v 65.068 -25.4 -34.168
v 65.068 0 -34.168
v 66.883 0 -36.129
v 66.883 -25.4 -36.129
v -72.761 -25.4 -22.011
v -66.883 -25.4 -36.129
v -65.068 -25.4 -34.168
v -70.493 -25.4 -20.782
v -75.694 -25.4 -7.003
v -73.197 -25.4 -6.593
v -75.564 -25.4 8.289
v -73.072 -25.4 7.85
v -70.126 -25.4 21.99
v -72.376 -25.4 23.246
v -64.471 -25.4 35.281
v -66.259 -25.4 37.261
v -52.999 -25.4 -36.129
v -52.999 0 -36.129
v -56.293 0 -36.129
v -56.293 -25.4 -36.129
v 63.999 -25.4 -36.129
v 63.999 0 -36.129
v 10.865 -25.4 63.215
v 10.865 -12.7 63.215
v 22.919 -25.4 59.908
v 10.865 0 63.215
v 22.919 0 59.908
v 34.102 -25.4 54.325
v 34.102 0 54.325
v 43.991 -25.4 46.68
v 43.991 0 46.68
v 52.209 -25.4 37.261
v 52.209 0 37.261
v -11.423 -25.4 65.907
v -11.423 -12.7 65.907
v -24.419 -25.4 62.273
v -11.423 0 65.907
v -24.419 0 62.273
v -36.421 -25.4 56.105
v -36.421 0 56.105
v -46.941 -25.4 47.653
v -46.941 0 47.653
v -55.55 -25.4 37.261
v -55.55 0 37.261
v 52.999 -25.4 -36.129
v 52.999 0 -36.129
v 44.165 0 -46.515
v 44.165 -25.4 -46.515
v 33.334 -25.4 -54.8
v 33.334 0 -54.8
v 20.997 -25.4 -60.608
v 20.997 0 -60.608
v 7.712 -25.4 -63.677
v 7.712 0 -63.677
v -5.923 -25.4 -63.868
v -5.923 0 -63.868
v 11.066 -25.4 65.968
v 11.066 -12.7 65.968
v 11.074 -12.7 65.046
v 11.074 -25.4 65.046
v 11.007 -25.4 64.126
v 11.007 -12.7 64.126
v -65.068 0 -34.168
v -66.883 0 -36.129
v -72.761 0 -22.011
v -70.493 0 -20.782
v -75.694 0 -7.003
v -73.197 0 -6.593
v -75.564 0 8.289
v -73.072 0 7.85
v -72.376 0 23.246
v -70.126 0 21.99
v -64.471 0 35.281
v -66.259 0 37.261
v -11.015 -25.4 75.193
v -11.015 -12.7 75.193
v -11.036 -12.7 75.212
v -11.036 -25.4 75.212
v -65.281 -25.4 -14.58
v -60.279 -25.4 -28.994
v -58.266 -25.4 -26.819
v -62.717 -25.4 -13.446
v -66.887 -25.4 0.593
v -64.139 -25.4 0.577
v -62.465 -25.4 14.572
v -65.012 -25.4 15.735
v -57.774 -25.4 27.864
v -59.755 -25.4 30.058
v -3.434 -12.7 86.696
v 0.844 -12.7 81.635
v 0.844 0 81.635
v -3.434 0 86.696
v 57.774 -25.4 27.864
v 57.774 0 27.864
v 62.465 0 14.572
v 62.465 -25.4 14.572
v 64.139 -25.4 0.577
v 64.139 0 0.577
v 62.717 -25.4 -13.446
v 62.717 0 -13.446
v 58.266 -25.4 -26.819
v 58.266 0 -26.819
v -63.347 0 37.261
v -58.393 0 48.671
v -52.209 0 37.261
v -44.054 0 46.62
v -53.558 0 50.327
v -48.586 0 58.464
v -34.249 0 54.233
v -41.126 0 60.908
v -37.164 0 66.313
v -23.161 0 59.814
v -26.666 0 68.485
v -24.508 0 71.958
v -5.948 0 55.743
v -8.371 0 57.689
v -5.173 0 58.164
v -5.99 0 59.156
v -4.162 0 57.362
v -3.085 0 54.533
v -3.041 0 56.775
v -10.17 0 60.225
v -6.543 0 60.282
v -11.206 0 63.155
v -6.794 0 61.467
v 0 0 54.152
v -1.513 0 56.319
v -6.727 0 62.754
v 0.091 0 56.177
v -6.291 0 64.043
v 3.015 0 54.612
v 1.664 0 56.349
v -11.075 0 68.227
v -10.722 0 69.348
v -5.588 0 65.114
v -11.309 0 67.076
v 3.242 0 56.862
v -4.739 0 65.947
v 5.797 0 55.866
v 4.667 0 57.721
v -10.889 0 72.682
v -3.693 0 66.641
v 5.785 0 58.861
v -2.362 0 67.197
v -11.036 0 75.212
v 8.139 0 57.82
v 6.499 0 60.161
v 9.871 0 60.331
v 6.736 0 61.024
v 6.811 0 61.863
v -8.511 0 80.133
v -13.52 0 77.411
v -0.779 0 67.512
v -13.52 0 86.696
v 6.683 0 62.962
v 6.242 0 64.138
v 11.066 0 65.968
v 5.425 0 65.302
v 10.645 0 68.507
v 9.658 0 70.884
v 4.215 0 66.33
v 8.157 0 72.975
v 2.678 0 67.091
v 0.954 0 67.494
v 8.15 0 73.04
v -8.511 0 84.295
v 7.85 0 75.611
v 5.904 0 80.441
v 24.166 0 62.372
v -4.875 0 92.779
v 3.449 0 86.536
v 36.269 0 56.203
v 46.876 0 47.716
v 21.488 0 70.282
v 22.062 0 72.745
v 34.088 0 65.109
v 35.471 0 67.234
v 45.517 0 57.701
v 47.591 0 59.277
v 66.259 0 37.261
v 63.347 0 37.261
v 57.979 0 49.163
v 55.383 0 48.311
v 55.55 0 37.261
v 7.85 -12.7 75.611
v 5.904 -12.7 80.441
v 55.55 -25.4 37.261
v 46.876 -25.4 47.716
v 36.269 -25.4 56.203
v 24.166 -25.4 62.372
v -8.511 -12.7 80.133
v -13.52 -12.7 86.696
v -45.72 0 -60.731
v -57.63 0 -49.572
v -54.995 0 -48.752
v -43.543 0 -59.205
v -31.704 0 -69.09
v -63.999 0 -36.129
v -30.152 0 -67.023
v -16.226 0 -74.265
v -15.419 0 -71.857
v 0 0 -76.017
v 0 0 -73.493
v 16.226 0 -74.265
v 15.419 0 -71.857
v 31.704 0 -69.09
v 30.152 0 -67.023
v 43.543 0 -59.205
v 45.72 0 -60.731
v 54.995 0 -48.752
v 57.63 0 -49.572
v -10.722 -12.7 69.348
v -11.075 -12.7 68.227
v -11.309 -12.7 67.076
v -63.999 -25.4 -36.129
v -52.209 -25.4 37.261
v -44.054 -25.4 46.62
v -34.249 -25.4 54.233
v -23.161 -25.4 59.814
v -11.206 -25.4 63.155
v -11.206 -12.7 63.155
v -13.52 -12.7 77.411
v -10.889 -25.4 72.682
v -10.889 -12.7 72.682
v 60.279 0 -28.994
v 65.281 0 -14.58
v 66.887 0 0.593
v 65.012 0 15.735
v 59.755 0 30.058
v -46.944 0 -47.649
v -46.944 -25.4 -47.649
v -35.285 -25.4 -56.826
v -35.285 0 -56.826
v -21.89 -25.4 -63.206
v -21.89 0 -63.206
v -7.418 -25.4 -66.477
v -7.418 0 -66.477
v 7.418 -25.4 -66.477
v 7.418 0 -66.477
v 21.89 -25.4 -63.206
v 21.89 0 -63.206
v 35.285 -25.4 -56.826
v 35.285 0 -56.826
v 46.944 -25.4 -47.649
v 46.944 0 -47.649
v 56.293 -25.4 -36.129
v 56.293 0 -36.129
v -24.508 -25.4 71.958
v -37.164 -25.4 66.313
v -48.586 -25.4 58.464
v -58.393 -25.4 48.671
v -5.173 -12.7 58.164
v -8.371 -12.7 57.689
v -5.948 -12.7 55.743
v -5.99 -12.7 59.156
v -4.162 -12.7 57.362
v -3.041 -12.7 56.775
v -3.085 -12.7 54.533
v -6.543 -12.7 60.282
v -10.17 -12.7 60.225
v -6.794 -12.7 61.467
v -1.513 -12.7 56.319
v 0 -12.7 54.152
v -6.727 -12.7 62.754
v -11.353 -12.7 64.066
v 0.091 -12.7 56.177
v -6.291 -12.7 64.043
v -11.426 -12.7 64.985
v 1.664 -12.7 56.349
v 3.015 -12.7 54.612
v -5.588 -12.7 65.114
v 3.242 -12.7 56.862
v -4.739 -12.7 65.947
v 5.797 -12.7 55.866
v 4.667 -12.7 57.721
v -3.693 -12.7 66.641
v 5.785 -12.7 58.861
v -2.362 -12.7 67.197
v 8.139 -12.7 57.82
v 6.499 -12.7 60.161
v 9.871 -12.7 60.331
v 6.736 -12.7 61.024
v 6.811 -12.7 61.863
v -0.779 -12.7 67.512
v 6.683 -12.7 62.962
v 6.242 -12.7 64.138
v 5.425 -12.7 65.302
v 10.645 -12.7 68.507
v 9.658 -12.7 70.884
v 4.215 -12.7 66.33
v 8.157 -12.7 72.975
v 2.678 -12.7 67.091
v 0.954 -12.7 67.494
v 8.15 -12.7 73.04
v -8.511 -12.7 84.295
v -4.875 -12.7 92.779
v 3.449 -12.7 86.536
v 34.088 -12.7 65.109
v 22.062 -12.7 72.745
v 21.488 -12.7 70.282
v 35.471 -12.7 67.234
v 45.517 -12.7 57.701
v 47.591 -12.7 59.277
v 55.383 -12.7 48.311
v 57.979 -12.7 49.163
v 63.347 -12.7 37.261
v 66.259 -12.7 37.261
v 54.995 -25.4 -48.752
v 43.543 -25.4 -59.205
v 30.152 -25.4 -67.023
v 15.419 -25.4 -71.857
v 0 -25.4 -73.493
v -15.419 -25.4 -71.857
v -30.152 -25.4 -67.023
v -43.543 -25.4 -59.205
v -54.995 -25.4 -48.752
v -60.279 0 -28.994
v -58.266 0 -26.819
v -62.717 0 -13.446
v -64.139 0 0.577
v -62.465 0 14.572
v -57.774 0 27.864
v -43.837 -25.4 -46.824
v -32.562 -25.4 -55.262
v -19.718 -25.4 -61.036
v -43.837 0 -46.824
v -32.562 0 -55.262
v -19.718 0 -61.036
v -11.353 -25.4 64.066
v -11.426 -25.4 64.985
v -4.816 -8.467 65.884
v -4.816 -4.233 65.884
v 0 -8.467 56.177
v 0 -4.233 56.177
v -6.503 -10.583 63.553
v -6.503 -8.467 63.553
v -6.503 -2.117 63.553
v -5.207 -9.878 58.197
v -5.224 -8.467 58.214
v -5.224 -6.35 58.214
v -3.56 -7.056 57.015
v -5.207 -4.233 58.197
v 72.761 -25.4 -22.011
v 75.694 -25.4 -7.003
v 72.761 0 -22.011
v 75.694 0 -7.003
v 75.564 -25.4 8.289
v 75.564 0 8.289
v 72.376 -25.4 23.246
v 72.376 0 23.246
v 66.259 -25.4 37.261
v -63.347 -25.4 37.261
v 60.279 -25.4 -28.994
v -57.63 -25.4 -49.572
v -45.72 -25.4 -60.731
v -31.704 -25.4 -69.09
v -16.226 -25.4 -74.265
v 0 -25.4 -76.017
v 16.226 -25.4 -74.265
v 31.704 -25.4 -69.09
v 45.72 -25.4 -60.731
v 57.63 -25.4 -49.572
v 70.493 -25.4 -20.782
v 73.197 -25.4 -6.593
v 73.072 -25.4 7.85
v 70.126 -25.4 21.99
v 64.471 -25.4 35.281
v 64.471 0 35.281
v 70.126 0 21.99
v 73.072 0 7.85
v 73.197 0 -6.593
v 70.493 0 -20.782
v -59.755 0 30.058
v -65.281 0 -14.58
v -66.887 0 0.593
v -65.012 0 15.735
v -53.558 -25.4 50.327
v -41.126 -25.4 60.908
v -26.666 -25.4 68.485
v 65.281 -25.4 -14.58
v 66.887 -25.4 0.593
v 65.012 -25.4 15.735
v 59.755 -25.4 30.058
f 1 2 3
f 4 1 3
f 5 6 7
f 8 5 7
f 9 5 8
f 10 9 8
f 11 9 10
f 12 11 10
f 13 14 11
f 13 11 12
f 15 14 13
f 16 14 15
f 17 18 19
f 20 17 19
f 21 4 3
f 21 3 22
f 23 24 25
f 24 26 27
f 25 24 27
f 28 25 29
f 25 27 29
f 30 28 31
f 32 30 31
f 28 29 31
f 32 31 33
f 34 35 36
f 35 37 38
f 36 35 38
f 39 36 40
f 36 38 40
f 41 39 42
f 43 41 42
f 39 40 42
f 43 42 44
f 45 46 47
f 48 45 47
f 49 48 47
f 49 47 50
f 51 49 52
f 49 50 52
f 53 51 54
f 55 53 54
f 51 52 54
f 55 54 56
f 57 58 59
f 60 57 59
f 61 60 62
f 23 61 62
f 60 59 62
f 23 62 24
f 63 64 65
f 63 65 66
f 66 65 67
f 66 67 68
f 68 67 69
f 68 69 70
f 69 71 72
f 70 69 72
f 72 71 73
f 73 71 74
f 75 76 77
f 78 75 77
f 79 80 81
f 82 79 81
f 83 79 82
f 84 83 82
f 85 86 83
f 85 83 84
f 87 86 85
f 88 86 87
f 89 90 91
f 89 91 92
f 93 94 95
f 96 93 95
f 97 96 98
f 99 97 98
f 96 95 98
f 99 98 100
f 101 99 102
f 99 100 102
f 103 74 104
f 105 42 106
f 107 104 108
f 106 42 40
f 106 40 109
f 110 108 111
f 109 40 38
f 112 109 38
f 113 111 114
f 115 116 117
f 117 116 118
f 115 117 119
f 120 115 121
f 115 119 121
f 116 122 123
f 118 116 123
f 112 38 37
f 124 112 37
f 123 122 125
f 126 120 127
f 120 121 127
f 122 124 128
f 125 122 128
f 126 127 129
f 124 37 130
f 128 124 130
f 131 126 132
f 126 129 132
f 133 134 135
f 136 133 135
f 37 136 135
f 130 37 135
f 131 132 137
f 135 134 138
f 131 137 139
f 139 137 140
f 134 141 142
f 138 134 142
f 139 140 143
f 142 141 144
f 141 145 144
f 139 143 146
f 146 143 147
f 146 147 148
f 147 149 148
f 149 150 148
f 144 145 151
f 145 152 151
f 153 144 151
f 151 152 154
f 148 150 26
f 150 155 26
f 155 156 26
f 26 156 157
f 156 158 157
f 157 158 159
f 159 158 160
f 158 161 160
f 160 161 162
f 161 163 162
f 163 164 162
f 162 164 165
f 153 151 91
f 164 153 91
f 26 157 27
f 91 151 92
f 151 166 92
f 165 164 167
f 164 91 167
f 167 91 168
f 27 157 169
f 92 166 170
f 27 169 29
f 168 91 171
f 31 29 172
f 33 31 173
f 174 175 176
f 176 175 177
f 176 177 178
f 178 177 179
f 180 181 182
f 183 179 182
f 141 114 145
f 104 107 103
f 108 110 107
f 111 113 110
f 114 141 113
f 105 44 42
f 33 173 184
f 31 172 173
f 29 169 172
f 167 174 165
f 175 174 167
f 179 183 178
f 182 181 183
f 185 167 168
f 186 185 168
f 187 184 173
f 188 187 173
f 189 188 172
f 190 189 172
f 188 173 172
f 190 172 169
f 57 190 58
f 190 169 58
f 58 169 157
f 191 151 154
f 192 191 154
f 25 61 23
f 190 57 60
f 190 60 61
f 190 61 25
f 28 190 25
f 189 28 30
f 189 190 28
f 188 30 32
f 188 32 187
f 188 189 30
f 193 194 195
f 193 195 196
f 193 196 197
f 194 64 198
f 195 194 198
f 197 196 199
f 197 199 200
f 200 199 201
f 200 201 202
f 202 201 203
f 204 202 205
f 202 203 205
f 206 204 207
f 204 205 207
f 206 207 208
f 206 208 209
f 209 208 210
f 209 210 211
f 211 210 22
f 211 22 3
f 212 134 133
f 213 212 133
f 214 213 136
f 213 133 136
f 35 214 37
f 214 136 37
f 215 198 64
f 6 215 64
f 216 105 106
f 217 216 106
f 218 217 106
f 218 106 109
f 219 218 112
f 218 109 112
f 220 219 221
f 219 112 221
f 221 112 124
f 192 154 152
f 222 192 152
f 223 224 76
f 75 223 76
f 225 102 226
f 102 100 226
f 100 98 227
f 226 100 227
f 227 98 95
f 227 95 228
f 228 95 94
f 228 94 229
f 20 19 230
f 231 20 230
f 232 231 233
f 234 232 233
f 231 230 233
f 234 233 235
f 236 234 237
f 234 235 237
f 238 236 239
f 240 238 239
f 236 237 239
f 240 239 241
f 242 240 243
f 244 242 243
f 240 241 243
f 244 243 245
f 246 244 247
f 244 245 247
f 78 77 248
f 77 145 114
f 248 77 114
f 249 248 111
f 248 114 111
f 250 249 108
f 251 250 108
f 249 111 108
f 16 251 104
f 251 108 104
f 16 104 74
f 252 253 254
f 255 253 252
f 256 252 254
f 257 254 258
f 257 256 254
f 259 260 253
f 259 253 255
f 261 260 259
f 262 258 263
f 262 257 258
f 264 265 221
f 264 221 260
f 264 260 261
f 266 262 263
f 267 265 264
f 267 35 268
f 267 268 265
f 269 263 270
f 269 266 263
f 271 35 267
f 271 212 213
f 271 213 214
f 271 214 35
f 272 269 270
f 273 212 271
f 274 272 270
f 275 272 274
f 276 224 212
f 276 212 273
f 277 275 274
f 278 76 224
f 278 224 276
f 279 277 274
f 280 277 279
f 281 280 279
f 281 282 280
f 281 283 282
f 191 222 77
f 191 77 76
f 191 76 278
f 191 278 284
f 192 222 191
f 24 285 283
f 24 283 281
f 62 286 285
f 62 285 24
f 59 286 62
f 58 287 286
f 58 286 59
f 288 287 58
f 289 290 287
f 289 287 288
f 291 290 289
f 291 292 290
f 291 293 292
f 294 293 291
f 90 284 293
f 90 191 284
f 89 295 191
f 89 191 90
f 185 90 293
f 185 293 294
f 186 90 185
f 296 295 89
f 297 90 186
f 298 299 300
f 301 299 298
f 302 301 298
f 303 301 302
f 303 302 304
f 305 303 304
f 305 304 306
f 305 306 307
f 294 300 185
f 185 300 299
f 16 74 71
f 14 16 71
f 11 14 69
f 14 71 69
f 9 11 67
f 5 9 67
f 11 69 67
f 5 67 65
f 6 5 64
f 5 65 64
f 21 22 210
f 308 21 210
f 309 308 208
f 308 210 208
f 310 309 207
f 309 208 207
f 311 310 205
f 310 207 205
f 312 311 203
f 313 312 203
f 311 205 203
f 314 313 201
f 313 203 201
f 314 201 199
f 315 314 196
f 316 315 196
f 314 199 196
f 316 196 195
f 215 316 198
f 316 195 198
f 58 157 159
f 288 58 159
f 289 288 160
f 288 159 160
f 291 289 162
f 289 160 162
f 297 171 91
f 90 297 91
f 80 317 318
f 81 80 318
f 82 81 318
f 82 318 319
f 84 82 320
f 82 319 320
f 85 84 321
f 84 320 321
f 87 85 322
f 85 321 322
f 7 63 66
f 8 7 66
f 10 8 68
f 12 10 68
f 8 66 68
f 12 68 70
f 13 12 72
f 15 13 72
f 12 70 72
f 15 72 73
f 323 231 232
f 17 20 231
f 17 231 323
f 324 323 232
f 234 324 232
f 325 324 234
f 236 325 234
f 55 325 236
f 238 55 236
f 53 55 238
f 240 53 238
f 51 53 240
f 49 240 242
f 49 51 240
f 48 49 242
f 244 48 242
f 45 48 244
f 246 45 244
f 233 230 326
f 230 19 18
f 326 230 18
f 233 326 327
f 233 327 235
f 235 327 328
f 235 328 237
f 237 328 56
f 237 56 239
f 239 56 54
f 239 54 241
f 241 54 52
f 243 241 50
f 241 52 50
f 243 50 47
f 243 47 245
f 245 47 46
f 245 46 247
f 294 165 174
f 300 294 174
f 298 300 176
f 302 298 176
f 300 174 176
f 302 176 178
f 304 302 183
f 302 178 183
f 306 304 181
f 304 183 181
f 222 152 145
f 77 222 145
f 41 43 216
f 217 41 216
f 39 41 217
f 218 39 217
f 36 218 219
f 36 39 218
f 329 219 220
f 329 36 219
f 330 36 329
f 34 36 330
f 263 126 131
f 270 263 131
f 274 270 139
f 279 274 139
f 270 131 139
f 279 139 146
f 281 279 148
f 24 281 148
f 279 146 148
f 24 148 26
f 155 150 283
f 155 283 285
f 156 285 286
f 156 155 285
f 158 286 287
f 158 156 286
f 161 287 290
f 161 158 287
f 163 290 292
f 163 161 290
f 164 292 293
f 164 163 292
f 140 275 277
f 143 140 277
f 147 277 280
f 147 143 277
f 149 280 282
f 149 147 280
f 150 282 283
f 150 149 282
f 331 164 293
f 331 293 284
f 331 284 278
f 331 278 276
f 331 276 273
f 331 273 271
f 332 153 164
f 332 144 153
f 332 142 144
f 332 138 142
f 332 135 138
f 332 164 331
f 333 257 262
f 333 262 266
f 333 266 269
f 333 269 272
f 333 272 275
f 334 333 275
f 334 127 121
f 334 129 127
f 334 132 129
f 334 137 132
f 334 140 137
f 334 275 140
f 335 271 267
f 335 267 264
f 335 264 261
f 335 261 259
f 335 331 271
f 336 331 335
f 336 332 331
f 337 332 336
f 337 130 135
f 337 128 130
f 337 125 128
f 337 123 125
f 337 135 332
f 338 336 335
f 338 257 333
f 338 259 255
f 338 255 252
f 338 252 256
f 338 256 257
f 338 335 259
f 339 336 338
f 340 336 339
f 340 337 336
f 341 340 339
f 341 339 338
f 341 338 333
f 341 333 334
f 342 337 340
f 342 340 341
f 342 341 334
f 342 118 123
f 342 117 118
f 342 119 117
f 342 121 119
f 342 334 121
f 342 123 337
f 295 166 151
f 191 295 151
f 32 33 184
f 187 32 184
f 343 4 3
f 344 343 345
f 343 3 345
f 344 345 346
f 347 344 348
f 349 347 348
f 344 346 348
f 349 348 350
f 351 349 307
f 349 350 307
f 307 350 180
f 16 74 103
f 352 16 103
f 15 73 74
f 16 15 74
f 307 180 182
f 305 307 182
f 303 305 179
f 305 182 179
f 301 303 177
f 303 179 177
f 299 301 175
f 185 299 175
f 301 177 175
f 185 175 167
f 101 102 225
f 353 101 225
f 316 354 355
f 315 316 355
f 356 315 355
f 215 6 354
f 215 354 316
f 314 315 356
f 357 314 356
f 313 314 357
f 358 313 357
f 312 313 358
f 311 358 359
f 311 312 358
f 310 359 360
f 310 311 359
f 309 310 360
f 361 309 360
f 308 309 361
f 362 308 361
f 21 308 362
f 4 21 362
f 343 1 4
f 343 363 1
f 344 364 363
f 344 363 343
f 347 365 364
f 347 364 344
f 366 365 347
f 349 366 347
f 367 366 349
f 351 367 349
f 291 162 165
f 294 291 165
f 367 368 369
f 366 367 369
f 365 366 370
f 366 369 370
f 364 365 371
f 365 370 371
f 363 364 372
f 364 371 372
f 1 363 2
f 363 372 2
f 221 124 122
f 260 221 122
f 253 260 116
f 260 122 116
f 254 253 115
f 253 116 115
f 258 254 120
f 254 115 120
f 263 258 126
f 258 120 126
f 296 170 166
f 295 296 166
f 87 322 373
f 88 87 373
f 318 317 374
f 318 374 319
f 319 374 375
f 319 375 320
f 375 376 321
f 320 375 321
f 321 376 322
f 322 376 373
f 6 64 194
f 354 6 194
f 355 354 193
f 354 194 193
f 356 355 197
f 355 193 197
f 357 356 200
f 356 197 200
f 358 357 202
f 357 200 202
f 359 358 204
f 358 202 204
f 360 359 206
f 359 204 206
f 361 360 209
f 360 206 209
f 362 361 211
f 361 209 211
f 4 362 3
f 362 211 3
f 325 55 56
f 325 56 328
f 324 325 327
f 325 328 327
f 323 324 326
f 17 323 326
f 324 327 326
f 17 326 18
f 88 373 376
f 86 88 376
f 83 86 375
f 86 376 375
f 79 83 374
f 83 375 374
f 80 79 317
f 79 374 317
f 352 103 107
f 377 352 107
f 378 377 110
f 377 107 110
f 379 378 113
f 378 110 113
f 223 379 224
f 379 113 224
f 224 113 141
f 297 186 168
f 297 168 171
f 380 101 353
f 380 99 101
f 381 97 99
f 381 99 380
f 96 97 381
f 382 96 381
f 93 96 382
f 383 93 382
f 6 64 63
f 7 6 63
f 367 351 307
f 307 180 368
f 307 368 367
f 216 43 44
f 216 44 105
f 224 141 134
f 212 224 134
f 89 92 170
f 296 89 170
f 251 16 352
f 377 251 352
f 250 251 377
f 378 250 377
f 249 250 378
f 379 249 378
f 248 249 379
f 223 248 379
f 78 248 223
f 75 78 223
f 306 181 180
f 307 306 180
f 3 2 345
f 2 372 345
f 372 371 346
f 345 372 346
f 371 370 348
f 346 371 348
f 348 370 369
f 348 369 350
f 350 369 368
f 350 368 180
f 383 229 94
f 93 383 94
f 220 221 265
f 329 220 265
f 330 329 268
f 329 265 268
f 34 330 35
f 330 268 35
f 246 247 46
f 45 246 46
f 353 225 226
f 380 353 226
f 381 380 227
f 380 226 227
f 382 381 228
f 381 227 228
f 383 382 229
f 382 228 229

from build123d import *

# Parameters (mm, degrees)
F1_DEPTH = 12.7
F2_DEPTH = 12.7
F3_DEPTH = 25.4


with BuildPart() as f1:
    # F0 (on Front) → F1 (new body)
    with BuildSketch(Plane.XZ):
        with BuildLine():
            Line((63.3466057456, 37.2614624353), (66.2585269888, 37.2614624353))
            ThreePointArc((66.2585269888, 37.2614624353), (41.7213166691, 63.5447929963), (7.8495076022, 75.6108075076))
            Line((7.8495076022, 75.6108075076), (8.149599797, 73.039667753))
            ThreePointArc((8.149599797, 73.039667753), (39.9743273325, 61.670594262), (63.3466057456, 37.2614624353))
        make_face()
    extrude(amount=F1_DEPTH)

    # F0 (on Front) → F2 (join)
    with BuildSketch(Plane.XZ):
        with BuildLine():
            Line((-13.5198486969, 77.4112045765), (-11.0363508402, 75.2117540128))
            Line((-11.0363508402, 75.2117540128), (-11.0152158886, 75.1930363476))
            Line((-11.0152158886, 75.1930363476), (-10.8890932148, 72.6817493686))
            Line((-10.8890932148, 72.6817493686), (-10.7216399074, 69.3475089983))
            ThreePointArc((-10.7216399074, 69.3475089983), (-11.2070945673, 67.6547579778), (-11.4226153517, 65.9070099881))
            ThreePointArc((-11.4226153517, 65.9070099881), (-11.3990376589, 64.5245886753), (-11.2061646472, 63.1554851017))
            ThreePointArc((-11.2061646472, 63.1554851017), (-7.2273940073, 56.6319895305), (0, 54.1517907207))
            ThreePointArc((0, 54.1517907207), (7.0342398464, 56.7632011171), (10.8647513242, 63.2151137245))
            ThreePointArc((10.8647513242, 63.2151137245), (11.0502238061, 64.5852394677), (11.0663314804, 65.9677679978))
            ThreePointArc((11.0663314804, 65.9677679978), (10.219864309, 69.7237927096), (8.1571629271, 72.9748681188))
            Line((8.1571629271, 72.9748681188), (8.149599797, 73.039667753))
            Line((8.149599797, 73.039667753), (7.8495076022, 75.6108075076))
            Line((7.8495076022, 75.6108075076), (5.9040827809, 80.4410629841))
            Line((5.9040827809, 80.4410629841), (3.4492560662, 86.5361019969))
            Line((3.4492560662, 86.5361019969), (0.8442020878, 81.6354675754))
            Line((0.8442020878, 81.6354675754), (-3.4344375599, 86.6961926222))
            Line((-3.4344375599, 86.6961926222), (-4.8752105795, 92.7794575691))
            Line((-4.8752105795, 92.7794575691), (-7.2979036912, 87.1251598455))
            Line((-7.2979036912, 87.1251598455), (-8.5105830804, 84.2949002981))
            Line((-8.5105830804, 84.2949002981), (-8.5105830804, 80.1326707005))
            Line((-8.5105830804, 80.1326707005), (-13.5198486969, 86.6961926222))
            Line((-13.5198486969, 86.6961926222), (-13.5198486969, 77.4112045765))
        make_face()
        with BuildLine():
            add(Edge.make_bspline(
                [(0, 56.1765415512), (6.811060477, 56.1765415512), (6.811060477, 61.8630424142)],
                knots=[4.7123889804, 4.7123889804, 4.7123889804, 6.2831853072, 6.2831853072, 6.2831853072], degree=2, weights=[1, 0.7071067812, 1]))
            add(Edge.make_bspline(
                [(6.811060477, 61.8630424142), (6.811060477, 75.59146992), (-4.8161470504, 65.8840057356), (-16.4433545778, 56.1765415512), (0, 56.1765415512)],
                knots=[0, 0, 0, 2.3561944902, 2.3561944902, 4.7123889804, 4.7123889804, 4.7123889804], degree=2, weights=[1, 0.3826834324, 1, 0.3826834324, 1]))
        make_face(mode=Mode.SUBTRACT)
    extrude(amount=F2_DEPTH)



with BuildPart() as f3:
    # F0 (on Front) → F3 (new body)
    with BuildSketch(Plane.XZ):
        with BuildLine():
            Line((-64.4705774478, 35.2810669604), (-66.2585269888, 37.2614624353))
            ThreePointArc((-66.2585269888, 37.2614624353), (-76.0144117829, 0.6466705791), (-66.8828733826, -36.1288005563))
            Line((-66.8828733826, -36.1288005563), (-65.0675415569, -34.1675881216))
            ThreePointArc((-65.0675415569, -34.1675881216), (-73.4902033743, 0.6317042963), (-64.4705774478, 35.2810669604))
        make_face()
    extrude(amount=F3_DEPTH)

    # F0 (on Front) → F3, piece 3 (join)
    with BuildSketch(Plane.XZ):
        with BuildLine():
            Line((-63.9993657209, -36.1288005563), (-66.8828733826, -36.1288005563))
            ThreePointArc((-66.8828733826, -36.1288005563), (0, -76.0171624144), (66.8828733826, -36.1288005563))
            Line((66.8828733826, -36.1288005563), (63.9993657209, -36.1288005563))
            ThreePointArc((63.9993657209, -36.1288005563), (0, -73.492918314), (-63.9993657209, -36.1288005563))
        make_face()
    extrude(amount=F3_DEPTH)


with BuildPart() as f3b:
    # F0 (on Front) → F3, piece 2 (new body)
    with BuildSketch(Plane.XZ):
        with BuildLine():
            Line((-57.773844186, 27.8635308694), (-59.7553816497, 30.0583511016))
            ThreePointArc((-59.7553816497, 30.0583511016), (-66.8869079538, 0.593002054), (-60.2789259459, -28.9941579264))
            Line((-60.2789259459, -28.9941579264), (-58.26590002, -26.8193646344))
            ThreePointArc((-58.26590002, -26.8193646344), (-64.1393820053, 0.5771486096), (-57.773844186, 27.8635308694))
        make_face()
    extrude(amount=F3_DEPTH)


with BuildPart() as f3c:
    # F0 (on Front) → F3, piece 4 (new body)
    with BuildSketch(Plane.XZ):
        with BuildLine():
            Line((-52.9990867365, -36.1288005563), (-56.2931601299, -36.1288005563))
            ThreePointArc((-56.2931601299, -36.1288005563), (0, -66.8895366036), (56.2931601299, -36.1288005563))
            Line((56.2931601299, -36.1288005563), (52.9990867365, -36.1288005563))
            ThreePointArc((52.9990867365, -36.1288005563), (27.3205154762, -58.0326016877), (-5.9227437242, -63.8679460396))
            ThreePointArc((-5.9227437242, -63.8679460396), (-32.5624104489, -55.2619475796), (-52.9990867365, -36.1288005563))
        make_face()
    extrude(amount=F3_DEPTH)


with BuildPart() as f3d:
    # F0 (on Front) → F3, piece 5 (new body)
    with BuildSketch(Plane.XZ):
        with BuildLine():
            Line((58.26590002, -26.8193646344), (60.2789259459, -28.9941579264))
            ThreePointArc((60.2789259459, -28.9941579264), (66.8869079538, 0.593002054), (59.7553816497, 30.0583511016))
            Line((59.7553816497, 30.0583511016), (57.773844186, 27.8635308694))
            ThreePointArc((57.773844186, 27.8635308694), (64.1393820053, 0.5771486096), (58.26590002, -26.8193646344))
        make_face()
    extrude(amount=F3_DEPTH)


with BuildPart() as f1_1:
    add(f1.part)

    add(f3.part)  # F3#6 merges F3
    # F0 (on Front) → F3, piece 6 (join)
    with BuildSketch(Plane.XZ):
        with BuildLine():
            Line((-11.0152158886, 75.1930363476), (-11.0363508402, 75.2117540128))
            ThreePointArc((-11.0363508402, 75.2117540128), (-43.0543922539, 62.6492481135), (-66.2585269888, 37.2614624353))
            Line((-66.2585269888, 37.2614624353), (-63.3466057456, 37.2614624353))
            ThreePointArc((-63.3466057456, 37.2614624353), (-41.1264383535, 60.9083336718), (-10.8890932148, 72.6817493686))
            Line((-10.8890932148, 72.6817493686), (-11.0152158886, 75.1930363476))
        make_face()
        with BuildLine():
            ThreePointArc((-11.4226153517, 65.9070099881), (-36.4207625545, 56.1047071287), (-55.5499192099, 37.2614624353))
            Line((-55.5499192099, 37.2614624353), (-52.2089728085, 37.2614624353))
            ThreePointArc((-52.2089728085, 37.2614624353), (-34.2490148339, 54.2328167021), (-11.2061646472, 63.1554851017))
            ThreePointArc((-11.2061646472, 63.1554851017), (-11.3990376589, 64.5245886753), (-11.4226153517, 65.9070099881))
        make_face()
        with BuildLine():
            ThreePointArc((10.8647513242, 63.2151137245), (34.1023704865, 54.3251484281), (52.2089728085, 37.2614624353))
            Line((52.2089728085, 37.2614624353), (55.5499192099, 37.2614624353))
            ThreePointArc((55.5499192099, 37.2614624353), (36.2690530449, 56.2028993761), (11.0663314804, 65.9677679978))
            ThreePointArc((11.0663314804, 65.9677679978), (11.0502238061, 64.5852394677), (10.8647513242, 63.2151137245))
        make_face()
        with BuildLine():
            Line((65.0675415569, -34.1675881216), (66.8828733826, -36.1288005563))
            ThreePointArc((66.8828733826, -36.1288005563), (76.0144117829, 0.6466705791), (66.2585269888, 37.2614624353))
            Line((66.2585269888, 37.2614624353), (64.4705774478, 35.2810669604))
            ThreePointArc((64.4705774478, 35.2810669604), (73.4902033743, 0.6317042963), (65.0675415569, -34.1675881216))
        make_face()
    extrude(amount=F3_DEPTH)


solid = Compound([f3b.part, f3c.part, f3d.part, f1_1.part])
